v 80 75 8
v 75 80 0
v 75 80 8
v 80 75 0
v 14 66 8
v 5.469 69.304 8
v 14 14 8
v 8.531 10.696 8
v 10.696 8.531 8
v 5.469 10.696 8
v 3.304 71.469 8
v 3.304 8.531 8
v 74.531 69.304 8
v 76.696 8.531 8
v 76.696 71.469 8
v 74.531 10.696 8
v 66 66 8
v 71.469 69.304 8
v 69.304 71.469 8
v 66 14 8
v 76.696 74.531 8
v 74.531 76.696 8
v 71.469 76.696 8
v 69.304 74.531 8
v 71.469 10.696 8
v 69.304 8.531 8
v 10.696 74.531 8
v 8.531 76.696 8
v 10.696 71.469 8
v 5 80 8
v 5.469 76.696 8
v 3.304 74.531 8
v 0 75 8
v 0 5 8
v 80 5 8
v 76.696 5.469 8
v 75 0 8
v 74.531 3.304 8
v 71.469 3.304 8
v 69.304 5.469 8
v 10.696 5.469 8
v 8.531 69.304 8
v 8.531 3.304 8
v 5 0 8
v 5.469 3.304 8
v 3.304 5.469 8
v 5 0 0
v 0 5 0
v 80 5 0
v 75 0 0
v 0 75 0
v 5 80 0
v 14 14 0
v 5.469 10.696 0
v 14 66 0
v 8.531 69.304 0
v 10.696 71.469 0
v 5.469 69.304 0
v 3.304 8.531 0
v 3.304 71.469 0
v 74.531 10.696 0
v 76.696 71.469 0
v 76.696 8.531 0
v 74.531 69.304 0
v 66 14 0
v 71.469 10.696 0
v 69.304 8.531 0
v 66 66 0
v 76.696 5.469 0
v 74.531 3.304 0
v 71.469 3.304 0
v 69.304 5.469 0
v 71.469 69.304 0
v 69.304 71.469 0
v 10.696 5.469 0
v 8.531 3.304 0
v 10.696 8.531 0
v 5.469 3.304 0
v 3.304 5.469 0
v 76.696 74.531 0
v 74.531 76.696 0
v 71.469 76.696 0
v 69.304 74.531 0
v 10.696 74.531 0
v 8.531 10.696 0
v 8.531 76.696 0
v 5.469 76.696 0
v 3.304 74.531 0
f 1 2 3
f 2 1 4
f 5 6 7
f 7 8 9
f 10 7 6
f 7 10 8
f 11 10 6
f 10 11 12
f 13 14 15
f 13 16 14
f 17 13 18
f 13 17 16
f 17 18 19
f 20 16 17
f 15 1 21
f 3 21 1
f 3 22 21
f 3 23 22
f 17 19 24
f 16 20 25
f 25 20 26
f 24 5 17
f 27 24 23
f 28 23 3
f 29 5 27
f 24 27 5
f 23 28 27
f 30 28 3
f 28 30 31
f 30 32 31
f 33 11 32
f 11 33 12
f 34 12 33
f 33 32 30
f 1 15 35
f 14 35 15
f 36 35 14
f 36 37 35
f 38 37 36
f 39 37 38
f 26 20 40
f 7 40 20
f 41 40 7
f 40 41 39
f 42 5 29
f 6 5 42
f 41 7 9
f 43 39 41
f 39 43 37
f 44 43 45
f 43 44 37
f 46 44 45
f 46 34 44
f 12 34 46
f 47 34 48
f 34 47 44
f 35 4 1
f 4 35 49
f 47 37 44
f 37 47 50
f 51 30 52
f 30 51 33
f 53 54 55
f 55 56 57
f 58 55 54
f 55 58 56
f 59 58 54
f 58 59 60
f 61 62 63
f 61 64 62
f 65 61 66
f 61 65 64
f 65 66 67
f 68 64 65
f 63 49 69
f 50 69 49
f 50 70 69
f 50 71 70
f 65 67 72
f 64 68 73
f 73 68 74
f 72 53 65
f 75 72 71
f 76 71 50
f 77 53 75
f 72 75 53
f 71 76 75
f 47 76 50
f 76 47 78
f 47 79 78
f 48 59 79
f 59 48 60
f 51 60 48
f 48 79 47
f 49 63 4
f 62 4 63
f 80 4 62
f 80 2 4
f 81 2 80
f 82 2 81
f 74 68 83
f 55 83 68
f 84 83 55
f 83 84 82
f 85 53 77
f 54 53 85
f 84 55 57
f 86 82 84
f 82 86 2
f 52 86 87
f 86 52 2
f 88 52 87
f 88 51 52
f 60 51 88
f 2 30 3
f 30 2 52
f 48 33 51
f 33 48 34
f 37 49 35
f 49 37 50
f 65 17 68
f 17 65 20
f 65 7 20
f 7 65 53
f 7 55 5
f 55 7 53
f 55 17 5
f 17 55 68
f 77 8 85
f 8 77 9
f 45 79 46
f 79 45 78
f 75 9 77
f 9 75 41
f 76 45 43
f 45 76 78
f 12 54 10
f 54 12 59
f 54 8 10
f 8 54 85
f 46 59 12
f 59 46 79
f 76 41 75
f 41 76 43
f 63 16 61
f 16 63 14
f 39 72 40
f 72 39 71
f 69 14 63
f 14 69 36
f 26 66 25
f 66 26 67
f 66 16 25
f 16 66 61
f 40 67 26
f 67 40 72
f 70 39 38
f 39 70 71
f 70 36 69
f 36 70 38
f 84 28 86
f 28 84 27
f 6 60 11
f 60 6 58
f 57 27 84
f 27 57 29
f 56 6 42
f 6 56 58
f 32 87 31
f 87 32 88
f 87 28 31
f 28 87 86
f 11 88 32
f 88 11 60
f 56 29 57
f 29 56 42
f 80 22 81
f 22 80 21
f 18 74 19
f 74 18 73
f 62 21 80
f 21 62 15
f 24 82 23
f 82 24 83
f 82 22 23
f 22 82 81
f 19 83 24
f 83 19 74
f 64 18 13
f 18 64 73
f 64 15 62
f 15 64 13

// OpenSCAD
$fn = 32;

// ----------------------------------------------------------------------
// Frame plate: 80 x 80 frame, 14 mm rails
// ----------------------------------------------------------------------

// --- parameters (mm) ---
plate_l = 80;             // plate length, X
plate_w = 80;             // plate width, Y
plate_t = 8;              // plate thickness, Z (extrusion height)
corner_c = 5;             // corner chamfer
frame_bar = 14;           // frame rail width
bolt_r = 4;               // corner bolt window radius
bolt_inset = 7;           // bolt centre inset from the edges

win_l = plate_l - 2 * frame_bar;  // window length
win_w = plate_w - 2 * frame_bar;  // window width
bolt_d = 2 * bolt_r;  // corner hole diameter

profile = [[5, 0], [75, 0], [80, 5], [80, 75], [75, 80], [5, 80], [0, 75], [0, 5]];  // primary outline, 8 points, counter clockwise
void_1 = [[14, 14], [66, 14], [66, 66], [14, 66]];  // the window, 4 points
void_2 = [[10.696, 8.531], [8.531, 10.696], [5.469, 10.696], [3.304, 8.531], [3.304, 5.469], [5.469, 3.304], [8.531, 3.304], [10.696, 5.469]];  // corner bolt window, 8 points
void_3 = [[76.696, 8.531], [74.531, 10.696], [71.469, 10.696], [69.304, 8.531], [69.304, 5.469], [71.469, 3.304], [74.531, 3.304], [76.696, 5.469]];  // corner bolt window, 8 points
void_4 = [[10.696, 74.531], [8.531, 76.696], [5.469, 76.696], [3.304, 74.531], [3.304, 71.469], [5.469, 69.304], [8.531, 69.304], [10.696, 71.469]];  // corner bolt window, 8 points
void_5 = [[76.696, 74.531], [74.531, 76.696], [71.469, 76.696], [69.304, 74.531], [69.304, 71.469], [71.469, 69.304], [74.531, 69.304], [76.696, 71.469]];  // corner bolt window, 8 points

// --- the one profile operation ---
difference() {
  linear_extrude(height = plate_t) polygon(points = profile);
  translate([0, 0, -1])
    linear_extrude(height = plate_t + 2) polygon(points = void_1);
  translate([0, 0, -1])
    linear_extrude(height = plate_t + 2) polygon(points = void_2);
  translate([0, 0, -1])
    linear_extrude(height = plate_t + 2) polygon(points = void_3);
  translate([0, 0, -1])
    linear_extrude(height = plate_t + 2) polygon(points = void_4);
  translate([0, 0, -1])
    linear_extrude(height = plate_t + 2) polygon(points = void_5);
}
